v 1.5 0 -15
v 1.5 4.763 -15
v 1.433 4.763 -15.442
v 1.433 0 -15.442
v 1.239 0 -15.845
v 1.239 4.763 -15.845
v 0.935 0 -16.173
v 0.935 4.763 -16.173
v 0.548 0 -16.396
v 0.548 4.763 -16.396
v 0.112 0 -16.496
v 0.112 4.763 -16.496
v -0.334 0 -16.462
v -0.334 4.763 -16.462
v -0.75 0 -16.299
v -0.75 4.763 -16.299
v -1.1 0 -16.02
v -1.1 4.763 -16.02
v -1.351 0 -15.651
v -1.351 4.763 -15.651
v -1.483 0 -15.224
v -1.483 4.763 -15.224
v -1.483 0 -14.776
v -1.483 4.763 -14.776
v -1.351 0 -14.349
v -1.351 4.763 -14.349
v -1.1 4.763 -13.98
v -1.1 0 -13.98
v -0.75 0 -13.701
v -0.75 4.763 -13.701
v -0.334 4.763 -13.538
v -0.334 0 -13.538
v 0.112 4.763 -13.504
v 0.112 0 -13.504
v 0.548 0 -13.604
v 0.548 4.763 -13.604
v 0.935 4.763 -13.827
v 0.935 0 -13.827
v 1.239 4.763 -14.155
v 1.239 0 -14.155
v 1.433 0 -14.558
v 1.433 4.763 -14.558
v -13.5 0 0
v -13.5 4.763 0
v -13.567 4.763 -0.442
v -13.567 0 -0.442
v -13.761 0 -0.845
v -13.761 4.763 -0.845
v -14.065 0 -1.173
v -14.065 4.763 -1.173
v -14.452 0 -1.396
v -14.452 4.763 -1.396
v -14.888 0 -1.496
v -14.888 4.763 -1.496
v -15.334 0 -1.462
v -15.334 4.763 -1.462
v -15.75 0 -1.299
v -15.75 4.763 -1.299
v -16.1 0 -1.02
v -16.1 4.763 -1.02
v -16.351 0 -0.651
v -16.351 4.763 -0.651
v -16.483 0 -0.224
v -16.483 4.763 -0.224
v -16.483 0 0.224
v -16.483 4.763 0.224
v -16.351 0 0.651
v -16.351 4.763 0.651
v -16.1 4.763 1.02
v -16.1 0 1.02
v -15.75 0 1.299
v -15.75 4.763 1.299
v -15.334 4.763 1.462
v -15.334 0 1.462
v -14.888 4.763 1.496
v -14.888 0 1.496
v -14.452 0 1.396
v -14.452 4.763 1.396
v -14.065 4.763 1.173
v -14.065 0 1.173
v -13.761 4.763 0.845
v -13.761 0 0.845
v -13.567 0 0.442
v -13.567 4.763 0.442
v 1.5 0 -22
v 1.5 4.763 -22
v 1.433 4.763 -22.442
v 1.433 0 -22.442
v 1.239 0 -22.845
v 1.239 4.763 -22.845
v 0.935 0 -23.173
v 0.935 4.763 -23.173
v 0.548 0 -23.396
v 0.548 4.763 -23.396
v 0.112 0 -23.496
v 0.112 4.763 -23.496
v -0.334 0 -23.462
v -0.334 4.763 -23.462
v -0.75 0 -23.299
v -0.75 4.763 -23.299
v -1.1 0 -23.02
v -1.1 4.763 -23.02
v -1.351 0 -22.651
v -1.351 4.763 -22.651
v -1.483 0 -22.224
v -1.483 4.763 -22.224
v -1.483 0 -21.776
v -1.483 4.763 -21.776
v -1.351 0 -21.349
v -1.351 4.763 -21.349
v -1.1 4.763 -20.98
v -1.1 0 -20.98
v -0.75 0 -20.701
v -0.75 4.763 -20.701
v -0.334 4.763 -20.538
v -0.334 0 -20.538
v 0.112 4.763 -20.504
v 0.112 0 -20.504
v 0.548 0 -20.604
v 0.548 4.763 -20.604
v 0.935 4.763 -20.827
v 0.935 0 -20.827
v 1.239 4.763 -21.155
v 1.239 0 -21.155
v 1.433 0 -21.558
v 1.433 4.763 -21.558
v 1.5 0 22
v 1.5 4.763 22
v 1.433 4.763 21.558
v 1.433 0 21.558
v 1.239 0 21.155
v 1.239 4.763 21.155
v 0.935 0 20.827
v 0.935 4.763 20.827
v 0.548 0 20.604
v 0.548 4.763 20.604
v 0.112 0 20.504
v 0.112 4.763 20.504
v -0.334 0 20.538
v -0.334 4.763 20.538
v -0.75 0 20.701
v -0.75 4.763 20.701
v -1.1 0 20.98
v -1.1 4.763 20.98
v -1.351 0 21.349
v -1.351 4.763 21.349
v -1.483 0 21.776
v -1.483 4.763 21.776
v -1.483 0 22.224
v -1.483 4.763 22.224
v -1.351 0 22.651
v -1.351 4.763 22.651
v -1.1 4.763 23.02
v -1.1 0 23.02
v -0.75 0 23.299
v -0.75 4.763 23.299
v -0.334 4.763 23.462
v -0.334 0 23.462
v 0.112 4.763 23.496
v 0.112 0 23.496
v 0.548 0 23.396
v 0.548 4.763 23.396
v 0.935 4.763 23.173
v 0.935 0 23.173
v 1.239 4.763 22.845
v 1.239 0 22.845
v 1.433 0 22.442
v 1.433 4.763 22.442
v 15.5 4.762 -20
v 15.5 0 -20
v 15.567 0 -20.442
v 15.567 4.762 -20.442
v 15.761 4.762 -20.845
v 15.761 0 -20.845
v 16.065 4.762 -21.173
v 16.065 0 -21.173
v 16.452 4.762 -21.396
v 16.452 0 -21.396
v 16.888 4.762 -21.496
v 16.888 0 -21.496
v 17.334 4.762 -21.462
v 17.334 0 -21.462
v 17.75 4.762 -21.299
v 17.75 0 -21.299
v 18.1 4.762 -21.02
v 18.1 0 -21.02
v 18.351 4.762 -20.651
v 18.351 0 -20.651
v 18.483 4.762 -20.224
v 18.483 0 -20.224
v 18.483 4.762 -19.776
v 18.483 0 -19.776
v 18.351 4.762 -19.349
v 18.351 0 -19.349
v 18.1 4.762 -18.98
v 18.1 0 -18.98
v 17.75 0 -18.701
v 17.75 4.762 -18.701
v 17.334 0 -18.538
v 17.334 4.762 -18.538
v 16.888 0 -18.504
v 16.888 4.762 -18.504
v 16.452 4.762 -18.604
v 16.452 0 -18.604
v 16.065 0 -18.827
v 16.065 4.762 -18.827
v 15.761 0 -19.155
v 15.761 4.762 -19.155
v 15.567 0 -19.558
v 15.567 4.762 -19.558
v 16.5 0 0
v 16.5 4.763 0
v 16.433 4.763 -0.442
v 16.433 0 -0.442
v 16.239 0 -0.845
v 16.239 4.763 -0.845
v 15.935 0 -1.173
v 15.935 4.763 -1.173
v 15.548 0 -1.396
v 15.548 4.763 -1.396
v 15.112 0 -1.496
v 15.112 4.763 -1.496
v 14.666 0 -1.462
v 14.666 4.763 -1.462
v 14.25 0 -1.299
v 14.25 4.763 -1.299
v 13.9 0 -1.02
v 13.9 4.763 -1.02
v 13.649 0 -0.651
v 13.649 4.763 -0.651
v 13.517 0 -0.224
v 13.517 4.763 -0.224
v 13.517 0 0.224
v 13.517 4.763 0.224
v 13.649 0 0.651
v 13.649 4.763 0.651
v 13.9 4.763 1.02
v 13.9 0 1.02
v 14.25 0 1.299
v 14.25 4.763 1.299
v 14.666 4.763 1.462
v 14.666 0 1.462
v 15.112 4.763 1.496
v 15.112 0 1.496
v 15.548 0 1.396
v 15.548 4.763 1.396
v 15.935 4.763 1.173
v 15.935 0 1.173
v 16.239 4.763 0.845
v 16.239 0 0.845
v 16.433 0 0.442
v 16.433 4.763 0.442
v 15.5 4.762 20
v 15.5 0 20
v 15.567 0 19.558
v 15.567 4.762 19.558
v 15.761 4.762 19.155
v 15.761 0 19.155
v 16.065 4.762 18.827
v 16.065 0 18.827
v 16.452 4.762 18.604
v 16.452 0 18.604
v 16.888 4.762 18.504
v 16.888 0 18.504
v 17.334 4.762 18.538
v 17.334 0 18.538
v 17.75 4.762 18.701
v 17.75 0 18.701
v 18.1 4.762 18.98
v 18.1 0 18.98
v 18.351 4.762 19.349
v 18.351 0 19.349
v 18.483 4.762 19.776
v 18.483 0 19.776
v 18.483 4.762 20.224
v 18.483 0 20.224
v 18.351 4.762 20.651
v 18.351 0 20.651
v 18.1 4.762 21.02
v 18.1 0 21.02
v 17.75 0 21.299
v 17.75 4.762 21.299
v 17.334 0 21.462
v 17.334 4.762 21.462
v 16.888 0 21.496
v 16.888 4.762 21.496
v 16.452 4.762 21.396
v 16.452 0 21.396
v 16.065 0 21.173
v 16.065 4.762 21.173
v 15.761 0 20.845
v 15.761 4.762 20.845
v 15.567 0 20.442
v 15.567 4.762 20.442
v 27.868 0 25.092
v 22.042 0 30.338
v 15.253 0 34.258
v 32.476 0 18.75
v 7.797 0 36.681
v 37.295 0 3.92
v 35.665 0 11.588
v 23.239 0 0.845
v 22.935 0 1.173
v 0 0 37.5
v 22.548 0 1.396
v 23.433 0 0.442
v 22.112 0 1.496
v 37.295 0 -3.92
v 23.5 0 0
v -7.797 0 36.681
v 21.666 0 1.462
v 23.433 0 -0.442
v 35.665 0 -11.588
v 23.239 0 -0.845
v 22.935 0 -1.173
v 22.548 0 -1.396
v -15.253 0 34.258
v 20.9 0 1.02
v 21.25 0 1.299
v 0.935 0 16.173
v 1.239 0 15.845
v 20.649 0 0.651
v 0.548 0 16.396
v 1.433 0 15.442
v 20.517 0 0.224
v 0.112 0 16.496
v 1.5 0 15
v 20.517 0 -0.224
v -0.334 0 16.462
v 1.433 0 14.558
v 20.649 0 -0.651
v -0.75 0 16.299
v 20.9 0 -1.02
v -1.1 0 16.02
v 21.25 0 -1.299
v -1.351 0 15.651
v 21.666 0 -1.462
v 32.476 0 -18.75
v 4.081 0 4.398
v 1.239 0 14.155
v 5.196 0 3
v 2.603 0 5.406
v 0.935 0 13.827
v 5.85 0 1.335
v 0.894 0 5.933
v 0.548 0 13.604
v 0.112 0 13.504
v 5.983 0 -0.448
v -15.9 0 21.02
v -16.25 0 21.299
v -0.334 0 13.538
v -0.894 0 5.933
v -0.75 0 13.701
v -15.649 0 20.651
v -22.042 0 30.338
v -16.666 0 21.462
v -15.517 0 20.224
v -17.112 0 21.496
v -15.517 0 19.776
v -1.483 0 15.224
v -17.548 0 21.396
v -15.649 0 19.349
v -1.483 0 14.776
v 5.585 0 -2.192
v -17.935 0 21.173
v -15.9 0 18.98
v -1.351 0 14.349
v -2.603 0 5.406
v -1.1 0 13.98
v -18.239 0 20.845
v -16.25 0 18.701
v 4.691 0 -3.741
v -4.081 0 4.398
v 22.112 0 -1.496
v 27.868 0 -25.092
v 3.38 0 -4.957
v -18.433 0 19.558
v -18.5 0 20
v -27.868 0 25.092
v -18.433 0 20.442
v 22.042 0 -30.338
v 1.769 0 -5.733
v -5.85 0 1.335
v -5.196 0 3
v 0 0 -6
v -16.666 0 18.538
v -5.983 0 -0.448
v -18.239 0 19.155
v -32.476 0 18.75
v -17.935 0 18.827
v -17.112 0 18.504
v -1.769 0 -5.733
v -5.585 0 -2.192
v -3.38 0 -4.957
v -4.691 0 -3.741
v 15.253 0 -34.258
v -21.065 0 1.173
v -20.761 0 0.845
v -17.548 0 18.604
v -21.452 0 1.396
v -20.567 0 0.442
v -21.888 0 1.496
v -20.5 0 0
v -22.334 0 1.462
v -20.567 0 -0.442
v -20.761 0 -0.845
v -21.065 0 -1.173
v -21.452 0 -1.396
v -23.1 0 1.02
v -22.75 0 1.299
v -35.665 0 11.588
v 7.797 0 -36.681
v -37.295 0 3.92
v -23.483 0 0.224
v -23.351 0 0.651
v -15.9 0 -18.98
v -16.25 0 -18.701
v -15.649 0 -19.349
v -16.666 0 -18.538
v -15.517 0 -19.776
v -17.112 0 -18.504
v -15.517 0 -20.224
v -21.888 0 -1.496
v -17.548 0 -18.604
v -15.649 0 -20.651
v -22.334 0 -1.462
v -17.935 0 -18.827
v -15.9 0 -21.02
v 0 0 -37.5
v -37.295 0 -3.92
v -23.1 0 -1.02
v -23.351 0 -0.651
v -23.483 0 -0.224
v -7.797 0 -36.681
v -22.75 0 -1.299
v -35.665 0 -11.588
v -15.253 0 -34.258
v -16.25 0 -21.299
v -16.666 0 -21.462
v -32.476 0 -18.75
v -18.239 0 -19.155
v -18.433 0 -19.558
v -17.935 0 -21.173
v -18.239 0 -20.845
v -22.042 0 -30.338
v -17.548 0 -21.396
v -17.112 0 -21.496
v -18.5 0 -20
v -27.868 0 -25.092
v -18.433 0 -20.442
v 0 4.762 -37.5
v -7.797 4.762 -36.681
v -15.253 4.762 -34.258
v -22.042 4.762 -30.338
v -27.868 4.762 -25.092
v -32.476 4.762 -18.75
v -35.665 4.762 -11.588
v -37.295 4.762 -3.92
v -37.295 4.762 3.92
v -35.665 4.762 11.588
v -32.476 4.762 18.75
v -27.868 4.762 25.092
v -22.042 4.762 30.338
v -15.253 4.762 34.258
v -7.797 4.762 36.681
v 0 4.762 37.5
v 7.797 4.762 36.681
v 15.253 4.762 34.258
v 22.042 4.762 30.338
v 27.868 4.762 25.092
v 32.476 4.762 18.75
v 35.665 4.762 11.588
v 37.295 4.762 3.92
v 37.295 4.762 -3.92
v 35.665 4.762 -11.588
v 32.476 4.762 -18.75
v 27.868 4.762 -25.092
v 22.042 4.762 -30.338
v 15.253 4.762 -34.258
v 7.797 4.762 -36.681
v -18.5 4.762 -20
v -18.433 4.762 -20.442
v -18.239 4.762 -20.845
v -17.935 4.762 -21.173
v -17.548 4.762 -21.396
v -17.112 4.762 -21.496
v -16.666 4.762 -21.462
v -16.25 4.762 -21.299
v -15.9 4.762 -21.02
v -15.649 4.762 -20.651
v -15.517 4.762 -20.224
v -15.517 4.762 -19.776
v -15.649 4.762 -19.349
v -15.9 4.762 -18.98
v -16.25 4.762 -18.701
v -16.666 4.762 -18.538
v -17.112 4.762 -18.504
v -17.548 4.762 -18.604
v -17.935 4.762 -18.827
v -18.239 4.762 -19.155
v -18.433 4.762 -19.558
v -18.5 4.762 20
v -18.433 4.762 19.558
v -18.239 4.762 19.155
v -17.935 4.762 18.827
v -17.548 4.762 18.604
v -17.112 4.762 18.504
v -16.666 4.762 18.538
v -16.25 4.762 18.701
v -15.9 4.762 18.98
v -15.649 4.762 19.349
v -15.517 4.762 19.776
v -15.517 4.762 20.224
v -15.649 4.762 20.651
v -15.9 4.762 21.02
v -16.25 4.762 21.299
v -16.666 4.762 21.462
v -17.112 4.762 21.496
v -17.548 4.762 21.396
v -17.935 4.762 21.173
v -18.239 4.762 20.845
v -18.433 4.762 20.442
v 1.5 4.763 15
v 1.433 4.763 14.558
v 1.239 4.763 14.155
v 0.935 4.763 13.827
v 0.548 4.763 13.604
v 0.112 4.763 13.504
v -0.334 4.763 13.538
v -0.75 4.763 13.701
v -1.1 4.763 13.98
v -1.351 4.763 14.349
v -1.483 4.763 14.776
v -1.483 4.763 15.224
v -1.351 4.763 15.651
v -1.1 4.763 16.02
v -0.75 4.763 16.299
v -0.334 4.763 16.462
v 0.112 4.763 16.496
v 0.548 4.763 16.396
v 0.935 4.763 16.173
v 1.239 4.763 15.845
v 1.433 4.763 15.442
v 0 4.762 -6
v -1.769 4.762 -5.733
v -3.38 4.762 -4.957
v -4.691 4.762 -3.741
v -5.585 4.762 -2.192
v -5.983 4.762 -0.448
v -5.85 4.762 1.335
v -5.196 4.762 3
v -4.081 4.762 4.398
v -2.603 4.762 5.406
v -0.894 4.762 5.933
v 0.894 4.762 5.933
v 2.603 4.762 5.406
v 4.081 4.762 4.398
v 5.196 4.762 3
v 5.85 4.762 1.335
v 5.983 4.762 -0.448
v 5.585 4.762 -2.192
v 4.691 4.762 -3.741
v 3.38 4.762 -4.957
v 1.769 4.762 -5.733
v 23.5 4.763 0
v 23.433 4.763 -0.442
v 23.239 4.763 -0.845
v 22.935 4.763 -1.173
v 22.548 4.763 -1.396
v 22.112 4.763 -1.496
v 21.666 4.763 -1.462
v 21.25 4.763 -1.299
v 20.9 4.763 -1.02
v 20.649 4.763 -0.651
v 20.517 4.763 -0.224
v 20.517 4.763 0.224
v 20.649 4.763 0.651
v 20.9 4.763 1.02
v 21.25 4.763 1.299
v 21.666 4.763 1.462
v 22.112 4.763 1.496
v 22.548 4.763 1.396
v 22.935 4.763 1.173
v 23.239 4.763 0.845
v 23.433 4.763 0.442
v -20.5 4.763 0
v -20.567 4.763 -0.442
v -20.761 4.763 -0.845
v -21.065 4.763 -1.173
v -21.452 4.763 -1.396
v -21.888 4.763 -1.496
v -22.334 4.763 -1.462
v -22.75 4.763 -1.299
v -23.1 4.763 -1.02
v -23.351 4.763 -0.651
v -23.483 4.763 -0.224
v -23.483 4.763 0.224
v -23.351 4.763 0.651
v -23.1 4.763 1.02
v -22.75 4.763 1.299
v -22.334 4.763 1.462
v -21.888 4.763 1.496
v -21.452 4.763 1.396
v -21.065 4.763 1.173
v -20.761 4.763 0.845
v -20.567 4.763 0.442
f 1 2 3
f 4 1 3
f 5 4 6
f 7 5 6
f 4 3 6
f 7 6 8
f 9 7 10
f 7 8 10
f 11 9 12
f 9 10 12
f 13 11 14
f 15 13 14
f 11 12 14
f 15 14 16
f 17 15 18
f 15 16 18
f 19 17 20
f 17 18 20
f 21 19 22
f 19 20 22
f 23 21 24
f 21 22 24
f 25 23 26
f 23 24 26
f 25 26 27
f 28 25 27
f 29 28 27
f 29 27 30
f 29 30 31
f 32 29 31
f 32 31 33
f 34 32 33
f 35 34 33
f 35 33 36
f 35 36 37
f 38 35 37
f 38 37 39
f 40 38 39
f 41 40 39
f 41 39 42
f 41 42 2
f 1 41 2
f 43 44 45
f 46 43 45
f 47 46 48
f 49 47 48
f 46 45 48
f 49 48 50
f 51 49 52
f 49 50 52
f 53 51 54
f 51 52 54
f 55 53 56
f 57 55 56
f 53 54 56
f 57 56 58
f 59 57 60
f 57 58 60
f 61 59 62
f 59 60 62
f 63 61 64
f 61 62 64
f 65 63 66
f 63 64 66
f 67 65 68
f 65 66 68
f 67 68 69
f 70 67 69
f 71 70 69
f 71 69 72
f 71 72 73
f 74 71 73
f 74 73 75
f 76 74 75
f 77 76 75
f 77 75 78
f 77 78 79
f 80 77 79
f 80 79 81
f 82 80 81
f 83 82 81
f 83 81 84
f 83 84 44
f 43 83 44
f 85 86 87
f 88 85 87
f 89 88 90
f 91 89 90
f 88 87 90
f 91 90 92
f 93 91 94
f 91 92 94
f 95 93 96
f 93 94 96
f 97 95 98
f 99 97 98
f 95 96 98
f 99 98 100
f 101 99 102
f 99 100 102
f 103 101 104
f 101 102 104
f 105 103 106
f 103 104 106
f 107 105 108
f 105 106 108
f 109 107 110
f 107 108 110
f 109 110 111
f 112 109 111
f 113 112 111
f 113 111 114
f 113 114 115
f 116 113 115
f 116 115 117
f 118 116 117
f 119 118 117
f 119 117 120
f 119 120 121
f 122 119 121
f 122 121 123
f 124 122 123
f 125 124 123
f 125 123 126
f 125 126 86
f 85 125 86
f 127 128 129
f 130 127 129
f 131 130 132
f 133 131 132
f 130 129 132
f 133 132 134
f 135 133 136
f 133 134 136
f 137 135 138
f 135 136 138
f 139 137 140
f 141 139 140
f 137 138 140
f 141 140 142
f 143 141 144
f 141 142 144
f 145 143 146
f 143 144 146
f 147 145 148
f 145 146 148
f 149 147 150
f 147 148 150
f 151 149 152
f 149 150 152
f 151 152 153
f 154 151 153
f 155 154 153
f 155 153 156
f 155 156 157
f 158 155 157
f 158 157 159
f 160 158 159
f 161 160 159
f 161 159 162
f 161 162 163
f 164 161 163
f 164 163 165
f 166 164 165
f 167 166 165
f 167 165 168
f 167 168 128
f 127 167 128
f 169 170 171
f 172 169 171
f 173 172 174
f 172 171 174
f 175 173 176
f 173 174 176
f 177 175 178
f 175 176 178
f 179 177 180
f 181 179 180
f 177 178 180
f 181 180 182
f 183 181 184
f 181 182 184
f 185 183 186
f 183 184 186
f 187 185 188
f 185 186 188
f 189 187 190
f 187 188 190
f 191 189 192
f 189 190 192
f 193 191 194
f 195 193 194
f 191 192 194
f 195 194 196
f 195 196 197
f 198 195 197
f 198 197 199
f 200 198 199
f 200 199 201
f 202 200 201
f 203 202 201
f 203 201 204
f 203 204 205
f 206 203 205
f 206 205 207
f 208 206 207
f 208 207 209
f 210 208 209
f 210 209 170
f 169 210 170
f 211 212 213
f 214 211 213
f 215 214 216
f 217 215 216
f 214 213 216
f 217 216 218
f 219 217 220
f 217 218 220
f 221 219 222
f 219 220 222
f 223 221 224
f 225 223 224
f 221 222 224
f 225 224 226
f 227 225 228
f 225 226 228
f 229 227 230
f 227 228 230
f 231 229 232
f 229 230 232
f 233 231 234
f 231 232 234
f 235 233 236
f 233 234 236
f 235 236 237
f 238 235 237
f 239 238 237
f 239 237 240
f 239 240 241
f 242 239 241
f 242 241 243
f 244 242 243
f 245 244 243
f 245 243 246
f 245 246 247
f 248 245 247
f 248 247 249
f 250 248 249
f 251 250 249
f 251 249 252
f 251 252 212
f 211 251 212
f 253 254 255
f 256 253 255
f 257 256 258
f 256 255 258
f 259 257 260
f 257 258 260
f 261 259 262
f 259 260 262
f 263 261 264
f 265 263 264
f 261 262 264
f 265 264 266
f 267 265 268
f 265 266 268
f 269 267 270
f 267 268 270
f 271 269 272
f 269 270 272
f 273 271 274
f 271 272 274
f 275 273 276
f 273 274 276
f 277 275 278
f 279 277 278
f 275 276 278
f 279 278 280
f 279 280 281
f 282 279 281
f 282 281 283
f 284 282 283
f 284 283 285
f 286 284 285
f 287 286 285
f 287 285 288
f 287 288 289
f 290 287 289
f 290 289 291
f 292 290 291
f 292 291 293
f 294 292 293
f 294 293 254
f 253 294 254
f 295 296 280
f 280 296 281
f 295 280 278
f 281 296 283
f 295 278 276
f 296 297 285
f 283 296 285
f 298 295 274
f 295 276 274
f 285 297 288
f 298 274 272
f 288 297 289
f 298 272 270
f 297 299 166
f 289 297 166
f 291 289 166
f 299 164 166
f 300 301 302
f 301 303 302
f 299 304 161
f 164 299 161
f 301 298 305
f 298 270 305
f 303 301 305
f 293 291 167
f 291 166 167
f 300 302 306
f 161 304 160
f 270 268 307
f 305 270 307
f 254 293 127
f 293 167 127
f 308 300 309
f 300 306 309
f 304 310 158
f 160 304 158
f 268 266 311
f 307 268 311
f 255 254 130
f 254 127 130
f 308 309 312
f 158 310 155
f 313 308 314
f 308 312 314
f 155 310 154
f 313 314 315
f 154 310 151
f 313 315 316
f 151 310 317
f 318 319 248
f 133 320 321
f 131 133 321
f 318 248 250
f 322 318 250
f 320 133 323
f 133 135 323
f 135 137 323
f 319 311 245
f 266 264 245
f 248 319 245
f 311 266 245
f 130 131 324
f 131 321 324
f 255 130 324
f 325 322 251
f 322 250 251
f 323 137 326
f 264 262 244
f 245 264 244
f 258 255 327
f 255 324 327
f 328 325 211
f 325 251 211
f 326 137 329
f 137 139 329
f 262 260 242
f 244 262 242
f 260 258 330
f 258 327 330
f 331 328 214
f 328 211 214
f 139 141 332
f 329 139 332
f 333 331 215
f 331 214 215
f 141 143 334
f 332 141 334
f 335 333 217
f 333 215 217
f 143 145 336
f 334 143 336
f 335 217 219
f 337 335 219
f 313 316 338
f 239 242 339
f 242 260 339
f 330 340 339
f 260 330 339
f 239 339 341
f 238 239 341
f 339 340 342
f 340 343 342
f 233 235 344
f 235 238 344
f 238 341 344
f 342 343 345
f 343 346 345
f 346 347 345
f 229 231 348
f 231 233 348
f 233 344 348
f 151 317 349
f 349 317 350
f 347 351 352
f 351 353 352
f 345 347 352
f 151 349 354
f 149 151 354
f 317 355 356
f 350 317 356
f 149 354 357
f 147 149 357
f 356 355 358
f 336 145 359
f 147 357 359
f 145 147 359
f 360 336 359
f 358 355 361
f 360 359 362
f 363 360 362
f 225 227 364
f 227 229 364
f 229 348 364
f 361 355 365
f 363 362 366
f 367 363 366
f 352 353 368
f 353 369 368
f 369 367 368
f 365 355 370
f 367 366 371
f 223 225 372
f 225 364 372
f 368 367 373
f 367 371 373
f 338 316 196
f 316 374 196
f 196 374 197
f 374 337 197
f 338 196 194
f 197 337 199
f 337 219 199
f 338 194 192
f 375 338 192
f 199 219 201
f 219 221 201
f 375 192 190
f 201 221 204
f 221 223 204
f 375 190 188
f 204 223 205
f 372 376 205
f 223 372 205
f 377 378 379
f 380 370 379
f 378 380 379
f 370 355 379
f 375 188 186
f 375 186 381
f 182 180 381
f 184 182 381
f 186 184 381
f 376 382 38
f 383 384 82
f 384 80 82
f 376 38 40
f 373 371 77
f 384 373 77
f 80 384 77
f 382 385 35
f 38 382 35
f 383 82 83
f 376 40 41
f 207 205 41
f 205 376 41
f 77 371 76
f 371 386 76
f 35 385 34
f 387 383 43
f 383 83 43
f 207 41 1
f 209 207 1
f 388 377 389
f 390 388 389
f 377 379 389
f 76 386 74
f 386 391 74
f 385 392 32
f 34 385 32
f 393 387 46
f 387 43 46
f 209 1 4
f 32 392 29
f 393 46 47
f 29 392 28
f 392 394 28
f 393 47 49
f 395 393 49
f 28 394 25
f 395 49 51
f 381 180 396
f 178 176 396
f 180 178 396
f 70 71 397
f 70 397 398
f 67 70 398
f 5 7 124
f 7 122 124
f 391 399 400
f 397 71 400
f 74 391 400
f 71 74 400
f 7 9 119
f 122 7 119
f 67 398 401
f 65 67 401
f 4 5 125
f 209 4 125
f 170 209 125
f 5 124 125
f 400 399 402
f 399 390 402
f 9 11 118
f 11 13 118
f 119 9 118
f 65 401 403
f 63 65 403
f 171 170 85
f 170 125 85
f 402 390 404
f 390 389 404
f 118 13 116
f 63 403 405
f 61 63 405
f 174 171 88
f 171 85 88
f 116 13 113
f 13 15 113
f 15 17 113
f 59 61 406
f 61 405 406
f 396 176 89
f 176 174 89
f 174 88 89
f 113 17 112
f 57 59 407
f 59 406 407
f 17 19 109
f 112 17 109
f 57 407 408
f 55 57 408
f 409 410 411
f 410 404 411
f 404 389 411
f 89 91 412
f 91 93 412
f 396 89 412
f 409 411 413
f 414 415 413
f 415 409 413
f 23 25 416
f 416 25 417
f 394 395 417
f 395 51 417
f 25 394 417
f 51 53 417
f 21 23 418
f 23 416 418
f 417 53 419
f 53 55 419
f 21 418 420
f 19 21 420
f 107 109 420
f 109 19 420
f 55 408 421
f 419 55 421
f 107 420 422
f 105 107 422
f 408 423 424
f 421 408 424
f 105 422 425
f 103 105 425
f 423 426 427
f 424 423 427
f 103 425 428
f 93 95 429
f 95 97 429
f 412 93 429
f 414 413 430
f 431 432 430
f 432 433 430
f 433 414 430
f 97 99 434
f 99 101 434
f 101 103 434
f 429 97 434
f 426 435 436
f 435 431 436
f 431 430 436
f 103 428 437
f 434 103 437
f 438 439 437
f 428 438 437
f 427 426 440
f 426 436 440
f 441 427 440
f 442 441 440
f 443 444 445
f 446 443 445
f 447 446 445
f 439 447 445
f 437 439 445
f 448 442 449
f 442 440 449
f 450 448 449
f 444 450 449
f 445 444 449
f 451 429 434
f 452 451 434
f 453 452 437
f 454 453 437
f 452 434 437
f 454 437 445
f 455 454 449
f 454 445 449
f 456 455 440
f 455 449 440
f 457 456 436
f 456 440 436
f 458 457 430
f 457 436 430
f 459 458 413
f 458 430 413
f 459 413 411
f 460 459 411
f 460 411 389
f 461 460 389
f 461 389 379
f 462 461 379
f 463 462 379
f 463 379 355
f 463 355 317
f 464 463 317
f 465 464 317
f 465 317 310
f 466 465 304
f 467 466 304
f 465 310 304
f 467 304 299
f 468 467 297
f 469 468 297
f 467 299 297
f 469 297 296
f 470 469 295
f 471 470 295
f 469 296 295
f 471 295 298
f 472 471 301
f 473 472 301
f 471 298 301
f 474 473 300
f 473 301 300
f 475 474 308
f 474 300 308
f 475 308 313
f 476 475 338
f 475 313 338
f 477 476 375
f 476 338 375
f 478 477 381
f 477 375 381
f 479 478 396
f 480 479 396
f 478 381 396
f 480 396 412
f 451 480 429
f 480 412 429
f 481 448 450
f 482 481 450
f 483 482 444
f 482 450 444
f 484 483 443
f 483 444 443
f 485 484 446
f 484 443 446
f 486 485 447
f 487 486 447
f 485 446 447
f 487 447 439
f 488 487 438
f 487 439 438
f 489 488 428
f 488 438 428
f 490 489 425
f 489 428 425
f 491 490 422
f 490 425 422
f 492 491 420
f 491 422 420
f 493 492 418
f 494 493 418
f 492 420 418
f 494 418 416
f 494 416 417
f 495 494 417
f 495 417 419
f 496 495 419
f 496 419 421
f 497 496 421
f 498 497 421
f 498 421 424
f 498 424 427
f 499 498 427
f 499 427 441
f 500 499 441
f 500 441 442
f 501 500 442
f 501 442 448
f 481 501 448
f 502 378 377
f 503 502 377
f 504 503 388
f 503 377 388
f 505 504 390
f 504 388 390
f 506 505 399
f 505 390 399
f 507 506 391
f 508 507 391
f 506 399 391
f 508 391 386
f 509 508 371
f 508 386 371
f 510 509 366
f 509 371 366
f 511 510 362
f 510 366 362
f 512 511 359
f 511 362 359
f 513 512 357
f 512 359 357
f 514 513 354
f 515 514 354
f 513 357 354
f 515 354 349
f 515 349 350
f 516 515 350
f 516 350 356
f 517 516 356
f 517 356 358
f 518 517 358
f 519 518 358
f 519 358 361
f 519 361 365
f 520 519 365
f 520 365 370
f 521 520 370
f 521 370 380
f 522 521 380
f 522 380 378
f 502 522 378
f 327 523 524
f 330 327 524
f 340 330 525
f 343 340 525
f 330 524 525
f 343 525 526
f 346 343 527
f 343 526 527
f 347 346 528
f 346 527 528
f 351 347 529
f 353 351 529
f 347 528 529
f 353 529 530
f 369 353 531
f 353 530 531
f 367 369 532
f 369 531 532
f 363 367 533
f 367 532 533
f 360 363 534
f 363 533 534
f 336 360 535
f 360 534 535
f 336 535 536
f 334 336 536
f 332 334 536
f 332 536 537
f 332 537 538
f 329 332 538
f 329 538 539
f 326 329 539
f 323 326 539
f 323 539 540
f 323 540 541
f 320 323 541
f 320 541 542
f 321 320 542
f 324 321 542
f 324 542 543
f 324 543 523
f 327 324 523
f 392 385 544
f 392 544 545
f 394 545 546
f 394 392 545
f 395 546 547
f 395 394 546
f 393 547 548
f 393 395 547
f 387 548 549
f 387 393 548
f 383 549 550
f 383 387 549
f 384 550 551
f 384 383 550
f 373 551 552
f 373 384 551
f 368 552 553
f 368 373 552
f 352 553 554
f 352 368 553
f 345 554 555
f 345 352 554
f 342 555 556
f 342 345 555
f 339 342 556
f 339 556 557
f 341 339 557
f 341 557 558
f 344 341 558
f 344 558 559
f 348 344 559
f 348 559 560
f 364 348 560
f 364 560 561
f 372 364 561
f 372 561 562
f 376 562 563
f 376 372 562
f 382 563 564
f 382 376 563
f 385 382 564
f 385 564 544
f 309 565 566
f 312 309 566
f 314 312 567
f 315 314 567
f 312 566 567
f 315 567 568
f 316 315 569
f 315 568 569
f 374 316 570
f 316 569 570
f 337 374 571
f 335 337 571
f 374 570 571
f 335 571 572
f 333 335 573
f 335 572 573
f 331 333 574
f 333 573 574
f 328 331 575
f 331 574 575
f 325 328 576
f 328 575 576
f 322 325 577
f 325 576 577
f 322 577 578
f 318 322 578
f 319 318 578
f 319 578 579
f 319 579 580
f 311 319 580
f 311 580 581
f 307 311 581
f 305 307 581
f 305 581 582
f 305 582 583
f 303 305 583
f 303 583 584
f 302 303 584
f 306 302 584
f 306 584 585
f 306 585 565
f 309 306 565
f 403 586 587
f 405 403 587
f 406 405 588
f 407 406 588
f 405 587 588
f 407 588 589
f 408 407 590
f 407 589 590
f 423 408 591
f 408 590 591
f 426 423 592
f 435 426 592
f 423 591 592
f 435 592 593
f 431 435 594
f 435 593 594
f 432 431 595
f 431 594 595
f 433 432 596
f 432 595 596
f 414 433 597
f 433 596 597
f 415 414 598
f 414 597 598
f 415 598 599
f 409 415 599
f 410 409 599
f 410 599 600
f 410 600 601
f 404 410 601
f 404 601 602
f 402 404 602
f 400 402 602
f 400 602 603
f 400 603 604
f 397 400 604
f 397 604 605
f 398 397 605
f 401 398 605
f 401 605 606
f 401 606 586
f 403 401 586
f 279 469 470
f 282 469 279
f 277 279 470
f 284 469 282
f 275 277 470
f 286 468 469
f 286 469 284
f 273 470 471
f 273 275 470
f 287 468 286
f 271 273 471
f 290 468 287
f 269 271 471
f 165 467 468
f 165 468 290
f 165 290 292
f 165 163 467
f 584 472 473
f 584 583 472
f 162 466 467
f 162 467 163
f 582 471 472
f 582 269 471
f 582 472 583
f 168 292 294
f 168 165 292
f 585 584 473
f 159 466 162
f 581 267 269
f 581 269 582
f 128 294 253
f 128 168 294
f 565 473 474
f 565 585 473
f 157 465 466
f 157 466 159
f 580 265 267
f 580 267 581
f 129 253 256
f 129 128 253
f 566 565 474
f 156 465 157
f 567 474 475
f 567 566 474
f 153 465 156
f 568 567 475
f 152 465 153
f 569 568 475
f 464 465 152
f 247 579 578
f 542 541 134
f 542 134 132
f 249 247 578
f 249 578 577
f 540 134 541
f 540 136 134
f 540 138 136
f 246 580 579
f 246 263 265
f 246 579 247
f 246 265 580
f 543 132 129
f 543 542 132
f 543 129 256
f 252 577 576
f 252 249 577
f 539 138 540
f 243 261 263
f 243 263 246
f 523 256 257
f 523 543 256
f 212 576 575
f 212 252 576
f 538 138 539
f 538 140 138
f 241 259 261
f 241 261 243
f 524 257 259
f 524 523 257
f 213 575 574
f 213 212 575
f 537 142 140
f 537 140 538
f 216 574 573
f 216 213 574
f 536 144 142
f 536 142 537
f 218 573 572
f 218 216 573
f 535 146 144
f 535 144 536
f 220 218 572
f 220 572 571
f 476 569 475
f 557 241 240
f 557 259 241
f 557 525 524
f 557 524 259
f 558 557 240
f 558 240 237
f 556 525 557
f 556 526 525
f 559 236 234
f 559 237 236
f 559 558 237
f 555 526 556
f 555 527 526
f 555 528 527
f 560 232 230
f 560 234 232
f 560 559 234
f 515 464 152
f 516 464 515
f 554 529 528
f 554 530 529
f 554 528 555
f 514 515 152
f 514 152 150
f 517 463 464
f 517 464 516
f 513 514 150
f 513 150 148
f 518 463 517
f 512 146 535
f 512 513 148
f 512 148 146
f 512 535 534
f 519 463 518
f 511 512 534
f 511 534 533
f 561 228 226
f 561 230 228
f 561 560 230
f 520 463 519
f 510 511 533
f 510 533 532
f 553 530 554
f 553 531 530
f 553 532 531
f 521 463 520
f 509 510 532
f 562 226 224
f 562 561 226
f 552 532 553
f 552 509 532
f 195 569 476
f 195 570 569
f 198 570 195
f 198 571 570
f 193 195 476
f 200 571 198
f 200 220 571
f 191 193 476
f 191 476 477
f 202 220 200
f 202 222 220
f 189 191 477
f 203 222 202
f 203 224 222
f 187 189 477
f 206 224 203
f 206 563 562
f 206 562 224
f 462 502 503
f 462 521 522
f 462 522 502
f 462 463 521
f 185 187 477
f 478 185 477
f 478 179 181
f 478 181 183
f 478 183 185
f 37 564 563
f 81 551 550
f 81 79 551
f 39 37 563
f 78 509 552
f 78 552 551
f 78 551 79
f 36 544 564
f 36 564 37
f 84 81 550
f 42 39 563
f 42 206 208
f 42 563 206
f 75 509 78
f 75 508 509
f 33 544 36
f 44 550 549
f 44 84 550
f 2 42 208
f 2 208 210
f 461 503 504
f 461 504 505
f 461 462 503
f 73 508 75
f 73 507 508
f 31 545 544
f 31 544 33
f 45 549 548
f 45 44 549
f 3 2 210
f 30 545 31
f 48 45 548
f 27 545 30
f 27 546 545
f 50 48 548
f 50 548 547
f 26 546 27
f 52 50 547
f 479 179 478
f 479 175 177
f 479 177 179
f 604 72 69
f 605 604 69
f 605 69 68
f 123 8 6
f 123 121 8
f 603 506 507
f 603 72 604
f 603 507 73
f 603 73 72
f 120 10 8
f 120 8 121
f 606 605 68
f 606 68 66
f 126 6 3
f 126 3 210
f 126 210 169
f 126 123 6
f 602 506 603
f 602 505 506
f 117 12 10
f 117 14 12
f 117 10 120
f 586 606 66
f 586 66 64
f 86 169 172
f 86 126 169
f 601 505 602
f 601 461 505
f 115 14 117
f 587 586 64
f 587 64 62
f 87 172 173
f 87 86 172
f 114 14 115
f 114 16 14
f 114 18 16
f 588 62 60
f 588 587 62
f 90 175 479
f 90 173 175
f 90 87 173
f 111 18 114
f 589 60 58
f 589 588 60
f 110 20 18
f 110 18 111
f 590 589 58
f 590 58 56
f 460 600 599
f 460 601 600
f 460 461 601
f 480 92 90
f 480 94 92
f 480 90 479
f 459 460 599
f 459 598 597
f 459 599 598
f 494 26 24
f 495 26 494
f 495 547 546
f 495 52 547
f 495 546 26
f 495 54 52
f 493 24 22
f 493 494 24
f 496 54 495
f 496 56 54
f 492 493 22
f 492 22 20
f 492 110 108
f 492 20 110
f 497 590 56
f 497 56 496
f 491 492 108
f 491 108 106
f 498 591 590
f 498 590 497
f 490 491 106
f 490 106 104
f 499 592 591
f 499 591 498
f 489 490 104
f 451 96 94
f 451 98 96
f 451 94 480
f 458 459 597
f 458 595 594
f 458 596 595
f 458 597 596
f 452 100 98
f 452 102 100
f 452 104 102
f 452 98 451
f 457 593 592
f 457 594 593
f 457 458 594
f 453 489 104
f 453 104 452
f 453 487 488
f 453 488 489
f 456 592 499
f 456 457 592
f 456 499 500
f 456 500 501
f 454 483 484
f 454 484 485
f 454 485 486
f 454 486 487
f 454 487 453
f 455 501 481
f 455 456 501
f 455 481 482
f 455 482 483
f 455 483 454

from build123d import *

# Parameters (mm, degrees)
SKETCH1_R                 = 37.5
SKETCH1_R_2               = 6
BOSS_EXTRUDE1_DEPTH       = 4.7625
F_3_0MM_DOWEL_HOLE1_D     = 3
F_3_0MM_DOWEL_HOLE4_D     = 3
F_3_0MM_DOWEL_HOLE4_DEPTH = 10
F_3_0MM_DOWEL_HOLE4_TIP   = 0.901290929


with BuildPart() as part:
    # Sketch1 → Boss-Extrude1 (new body)
    with BuildSketch(Plane(origin=(0, 0, 0), x_dir=(1, 0, 0), z_dir=(0, 1, 0))):
        with Locations(Location((0, 0, 0), (0, 0, 90))):
            Circle(SKETCH1_R)
        with Locations(Location((0, 0, 0), (0, 0, 90))):
            Circle(SKETCH1_R_2, mode=Mode.SUBTRACT)
    extrude(amount=BOSS_EXTRUDE1_DEPTH)

    # Ø3.0mm Dowel Hole1 (through all)
    with Locations(Plane(origin=(0, 0, 0), x_dir=(-1, 0, 0), z_dir=(0, -1, 0))):
        with Locations((0, 15), (0, 22), (22, 0), (15, 0), (0, -15), (0, -22), (-15, 0), (-22, 0)):
            Hole(F_3_0MM_DOWEL_HOLE1_D / 2)

    # Ø3.0mm Dowel Hole4
    with Locations(Plane(origin=(0, 4.7625, 0), x_dir=(1, 0, 0), z_dir=(0, 1, 0))):
        with Locations((-17, 20), (17, -20), (-17, -20), (17, 20)):
            Hole(F_3_0MM_DOWEL_HOLE4_D / 2, depth=F_3_0MM_DOWEL_HOLE4_DEPTH)
            with Locations((0, 0, -(F_3_0MM_DOWEL_HOLE4_DEPTH + F_3_0MM_DOWEL_HOLE4_TIP / 2))):  # 118° drill point
                Cone(0, F_3_0MM_DOWEL_HOLE4_D / 2, F_3_0MM_DOWEL_HOLE4_TIP, mode=Mode.SUBTRACT)


solid = part.part
